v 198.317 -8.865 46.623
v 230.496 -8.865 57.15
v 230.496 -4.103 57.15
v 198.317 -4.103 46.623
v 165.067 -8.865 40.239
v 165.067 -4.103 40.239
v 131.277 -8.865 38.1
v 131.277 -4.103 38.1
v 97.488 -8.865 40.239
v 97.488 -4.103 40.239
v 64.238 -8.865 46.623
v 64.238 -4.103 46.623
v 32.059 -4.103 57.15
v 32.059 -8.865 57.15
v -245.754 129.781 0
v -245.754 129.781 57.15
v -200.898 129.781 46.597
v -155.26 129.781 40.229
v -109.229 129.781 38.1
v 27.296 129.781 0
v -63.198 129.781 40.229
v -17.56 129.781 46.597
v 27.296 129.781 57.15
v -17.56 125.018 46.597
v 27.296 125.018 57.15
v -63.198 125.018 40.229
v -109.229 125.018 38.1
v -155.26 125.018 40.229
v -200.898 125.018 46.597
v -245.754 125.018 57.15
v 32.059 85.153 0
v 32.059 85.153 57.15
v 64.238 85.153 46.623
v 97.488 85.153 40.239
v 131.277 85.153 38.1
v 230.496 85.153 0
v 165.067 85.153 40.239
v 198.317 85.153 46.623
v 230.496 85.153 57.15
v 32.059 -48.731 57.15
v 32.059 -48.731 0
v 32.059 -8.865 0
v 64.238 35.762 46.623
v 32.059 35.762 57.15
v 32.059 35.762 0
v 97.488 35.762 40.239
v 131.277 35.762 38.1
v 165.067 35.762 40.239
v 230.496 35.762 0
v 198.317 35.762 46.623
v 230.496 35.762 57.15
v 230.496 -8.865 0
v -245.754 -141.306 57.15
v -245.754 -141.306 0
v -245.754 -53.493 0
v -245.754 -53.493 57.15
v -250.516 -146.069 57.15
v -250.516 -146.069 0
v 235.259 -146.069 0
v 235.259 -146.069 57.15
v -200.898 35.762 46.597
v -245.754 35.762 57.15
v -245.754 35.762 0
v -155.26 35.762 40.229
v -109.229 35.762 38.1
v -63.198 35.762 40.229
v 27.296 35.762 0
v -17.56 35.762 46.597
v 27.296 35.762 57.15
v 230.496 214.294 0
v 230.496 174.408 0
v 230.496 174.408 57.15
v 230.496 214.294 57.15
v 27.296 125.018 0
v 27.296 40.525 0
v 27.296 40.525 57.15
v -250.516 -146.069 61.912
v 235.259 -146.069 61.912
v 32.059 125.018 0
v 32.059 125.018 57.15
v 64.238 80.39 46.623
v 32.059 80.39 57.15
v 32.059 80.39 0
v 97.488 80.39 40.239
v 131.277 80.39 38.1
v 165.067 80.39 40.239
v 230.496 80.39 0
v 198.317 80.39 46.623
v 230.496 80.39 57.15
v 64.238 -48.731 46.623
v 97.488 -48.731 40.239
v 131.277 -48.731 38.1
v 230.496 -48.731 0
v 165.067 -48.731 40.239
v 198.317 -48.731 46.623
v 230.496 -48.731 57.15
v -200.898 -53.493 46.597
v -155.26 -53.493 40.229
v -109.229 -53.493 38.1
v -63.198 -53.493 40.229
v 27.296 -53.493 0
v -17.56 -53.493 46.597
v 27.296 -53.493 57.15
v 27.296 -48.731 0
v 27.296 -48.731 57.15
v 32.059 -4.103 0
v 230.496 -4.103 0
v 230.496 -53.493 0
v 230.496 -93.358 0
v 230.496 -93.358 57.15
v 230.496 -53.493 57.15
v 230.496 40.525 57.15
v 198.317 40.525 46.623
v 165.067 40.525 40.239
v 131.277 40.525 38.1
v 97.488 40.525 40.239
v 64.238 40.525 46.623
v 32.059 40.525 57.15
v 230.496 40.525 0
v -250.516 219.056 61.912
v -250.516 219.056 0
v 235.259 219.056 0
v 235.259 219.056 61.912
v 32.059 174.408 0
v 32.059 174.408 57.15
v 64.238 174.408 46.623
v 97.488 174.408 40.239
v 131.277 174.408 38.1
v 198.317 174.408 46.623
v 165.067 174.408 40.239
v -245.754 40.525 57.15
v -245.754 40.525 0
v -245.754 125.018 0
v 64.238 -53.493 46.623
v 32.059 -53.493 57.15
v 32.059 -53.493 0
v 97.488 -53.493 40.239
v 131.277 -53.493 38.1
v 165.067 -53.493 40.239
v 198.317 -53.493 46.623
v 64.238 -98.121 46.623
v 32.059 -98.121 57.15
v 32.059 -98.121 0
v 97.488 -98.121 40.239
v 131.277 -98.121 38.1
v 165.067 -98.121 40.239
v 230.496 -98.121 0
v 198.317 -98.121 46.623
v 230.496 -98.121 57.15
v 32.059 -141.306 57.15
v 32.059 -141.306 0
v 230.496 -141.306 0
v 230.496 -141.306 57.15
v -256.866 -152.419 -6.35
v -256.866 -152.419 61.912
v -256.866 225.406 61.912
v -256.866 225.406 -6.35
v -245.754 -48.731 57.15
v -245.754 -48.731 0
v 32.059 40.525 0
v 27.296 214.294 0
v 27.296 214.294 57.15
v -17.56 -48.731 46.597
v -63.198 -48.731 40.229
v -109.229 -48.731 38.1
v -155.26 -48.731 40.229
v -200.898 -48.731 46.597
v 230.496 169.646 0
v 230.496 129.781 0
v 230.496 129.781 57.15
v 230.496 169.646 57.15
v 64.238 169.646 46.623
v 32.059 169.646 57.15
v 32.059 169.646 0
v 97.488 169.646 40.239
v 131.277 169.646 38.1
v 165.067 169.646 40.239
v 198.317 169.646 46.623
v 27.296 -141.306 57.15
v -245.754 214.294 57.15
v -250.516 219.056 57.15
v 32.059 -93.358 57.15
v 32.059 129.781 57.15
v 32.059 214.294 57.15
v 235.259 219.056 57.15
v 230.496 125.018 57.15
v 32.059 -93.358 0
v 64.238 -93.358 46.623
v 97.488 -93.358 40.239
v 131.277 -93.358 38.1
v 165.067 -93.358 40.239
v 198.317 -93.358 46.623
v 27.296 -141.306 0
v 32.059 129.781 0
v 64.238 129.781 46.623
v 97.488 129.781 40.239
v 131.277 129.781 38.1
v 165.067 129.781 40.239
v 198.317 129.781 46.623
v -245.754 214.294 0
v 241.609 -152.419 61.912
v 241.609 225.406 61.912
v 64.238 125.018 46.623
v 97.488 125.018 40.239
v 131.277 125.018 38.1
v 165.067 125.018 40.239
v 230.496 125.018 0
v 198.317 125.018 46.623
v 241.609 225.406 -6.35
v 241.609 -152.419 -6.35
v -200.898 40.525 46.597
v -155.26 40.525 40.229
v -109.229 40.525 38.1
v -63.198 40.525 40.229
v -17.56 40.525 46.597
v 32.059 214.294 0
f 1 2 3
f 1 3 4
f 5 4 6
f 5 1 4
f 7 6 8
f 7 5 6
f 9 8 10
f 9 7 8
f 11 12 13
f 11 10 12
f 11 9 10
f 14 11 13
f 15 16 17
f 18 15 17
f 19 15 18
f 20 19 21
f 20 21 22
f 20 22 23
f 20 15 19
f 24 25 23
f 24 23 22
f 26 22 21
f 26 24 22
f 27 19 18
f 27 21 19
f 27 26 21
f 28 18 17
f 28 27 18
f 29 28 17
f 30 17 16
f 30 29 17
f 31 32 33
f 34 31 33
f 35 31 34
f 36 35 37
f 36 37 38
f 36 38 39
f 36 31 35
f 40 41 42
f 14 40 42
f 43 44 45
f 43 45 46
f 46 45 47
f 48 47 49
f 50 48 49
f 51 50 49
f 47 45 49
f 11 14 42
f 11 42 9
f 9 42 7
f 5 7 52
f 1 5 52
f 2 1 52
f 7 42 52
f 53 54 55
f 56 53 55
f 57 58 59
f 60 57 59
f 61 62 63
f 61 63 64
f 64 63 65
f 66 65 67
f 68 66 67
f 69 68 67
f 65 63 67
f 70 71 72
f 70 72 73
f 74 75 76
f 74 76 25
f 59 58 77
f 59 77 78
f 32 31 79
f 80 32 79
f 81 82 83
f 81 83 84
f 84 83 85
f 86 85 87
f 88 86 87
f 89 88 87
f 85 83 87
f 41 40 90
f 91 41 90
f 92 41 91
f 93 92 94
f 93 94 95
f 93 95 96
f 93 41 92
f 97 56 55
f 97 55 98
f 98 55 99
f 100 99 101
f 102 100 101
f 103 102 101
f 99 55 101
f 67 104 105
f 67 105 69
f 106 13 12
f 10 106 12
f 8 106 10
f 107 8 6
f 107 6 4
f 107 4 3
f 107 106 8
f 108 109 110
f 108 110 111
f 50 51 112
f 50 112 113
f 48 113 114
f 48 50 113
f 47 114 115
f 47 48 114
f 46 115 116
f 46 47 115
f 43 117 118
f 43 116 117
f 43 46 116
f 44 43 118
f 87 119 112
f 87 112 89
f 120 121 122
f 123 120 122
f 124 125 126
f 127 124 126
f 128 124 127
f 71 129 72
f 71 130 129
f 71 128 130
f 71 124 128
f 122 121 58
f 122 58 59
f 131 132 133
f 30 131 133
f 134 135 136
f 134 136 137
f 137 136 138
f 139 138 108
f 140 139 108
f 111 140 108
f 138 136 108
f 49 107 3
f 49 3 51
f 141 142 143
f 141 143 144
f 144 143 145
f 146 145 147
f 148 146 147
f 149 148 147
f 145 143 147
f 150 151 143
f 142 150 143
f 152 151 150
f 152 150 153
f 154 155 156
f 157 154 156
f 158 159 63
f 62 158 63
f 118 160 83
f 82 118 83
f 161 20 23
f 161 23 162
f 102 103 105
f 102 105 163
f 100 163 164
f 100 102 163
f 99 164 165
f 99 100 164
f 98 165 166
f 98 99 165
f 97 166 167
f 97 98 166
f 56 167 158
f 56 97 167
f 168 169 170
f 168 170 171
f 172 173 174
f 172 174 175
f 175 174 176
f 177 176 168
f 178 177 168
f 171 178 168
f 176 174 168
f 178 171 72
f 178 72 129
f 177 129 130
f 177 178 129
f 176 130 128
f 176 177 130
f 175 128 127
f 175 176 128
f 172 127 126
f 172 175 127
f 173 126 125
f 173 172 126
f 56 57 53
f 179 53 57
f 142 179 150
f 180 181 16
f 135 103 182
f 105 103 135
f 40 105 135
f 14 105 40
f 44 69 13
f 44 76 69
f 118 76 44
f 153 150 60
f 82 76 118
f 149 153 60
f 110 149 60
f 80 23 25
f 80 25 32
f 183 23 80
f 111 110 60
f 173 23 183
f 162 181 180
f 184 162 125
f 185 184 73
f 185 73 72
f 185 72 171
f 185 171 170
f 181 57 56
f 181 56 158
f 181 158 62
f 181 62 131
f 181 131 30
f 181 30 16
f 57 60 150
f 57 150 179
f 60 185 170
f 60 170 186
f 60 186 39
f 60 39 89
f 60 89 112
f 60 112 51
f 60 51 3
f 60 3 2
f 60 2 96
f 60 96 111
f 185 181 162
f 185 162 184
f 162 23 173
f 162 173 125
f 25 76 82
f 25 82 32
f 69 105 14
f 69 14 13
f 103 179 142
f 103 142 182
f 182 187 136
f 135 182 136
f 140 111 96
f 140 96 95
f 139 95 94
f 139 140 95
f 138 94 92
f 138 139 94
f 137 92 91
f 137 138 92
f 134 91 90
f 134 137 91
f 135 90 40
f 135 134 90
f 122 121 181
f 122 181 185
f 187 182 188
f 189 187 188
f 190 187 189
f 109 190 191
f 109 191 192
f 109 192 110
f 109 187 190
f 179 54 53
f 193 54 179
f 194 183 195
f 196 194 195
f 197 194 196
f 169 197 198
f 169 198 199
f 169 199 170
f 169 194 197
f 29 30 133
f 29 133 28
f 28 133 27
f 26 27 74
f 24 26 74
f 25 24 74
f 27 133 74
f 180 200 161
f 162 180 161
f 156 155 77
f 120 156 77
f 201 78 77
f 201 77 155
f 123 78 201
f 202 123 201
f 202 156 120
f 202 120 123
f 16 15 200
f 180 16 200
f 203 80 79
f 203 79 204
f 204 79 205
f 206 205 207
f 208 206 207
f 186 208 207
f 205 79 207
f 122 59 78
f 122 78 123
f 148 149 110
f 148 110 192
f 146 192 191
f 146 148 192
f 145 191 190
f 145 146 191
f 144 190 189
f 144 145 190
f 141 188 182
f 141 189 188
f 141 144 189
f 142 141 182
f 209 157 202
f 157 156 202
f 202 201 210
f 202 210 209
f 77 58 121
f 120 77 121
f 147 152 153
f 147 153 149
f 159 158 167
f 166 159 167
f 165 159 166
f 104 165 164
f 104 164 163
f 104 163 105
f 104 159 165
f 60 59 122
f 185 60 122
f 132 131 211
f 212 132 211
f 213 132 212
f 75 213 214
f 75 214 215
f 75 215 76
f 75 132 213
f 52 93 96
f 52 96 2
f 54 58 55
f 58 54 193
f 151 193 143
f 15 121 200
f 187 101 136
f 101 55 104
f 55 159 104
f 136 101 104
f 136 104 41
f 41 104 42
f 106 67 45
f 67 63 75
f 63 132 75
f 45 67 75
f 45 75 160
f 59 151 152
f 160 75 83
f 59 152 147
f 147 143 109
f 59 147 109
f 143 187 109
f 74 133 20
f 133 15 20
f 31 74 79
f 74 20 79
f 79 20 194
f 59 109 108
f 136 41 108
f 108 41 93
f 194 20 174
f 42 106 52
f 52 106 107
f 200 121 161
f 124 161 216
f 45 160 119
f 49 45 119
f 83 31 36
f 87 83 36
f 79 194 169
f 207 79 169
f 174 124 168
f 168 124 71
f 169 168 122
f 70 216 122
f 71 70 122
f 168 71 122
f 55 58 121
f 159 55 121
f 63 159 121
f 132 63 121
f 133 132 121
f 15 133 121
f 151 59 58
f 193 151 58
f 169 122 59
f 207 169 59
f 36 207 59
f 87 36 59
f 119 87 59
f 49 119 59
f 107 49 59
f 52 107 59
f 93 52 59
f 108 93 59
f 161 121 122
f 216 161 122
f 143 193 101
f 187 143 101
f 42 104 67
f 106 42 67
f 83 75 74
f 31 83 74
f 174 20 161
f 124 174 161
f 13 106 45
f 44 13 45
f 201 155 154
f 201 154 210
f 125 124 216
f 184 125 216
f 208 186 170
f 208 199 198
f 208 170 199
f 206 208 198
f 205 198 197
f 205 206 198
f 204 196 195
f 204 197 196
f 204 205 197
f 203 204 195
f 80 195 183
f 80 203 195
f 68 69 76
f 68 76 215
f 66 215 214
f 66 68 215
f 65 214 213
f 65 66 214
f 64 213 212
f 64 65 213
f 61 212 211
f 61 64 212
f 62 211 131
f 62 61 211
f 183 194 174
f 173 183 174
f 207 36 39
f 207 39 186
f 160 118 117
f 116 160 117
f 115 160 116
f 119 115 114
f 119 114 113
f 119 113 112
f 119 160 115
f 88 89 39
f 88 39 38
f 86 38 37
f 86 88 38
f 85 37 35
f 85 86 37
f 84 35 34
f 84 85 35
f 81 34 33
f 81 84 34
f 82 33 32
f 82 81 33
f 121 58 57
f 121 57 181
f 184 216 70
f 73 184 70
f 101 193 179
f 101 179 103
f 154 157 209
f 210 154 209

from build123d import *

# Parameters (mm, degrees)
F0_W     = 485.775
F0_H     = 365.125
F0_W_2   = 273.05
F0_H_2   = 87.8133544401
F0_H_3   = 84.4931
F0_W_3   = 198.4375
F0_H_4   = 43.1855544401
F0_H_5   = 39.8653
F0_H_6   = 84.5129455599
F0_H_7   = 39.8851455599
F1_DEPTH = 57.15
F0_W_4   = 498.475
F0_H_8   = 377.825
F2_DEPTH = 61.9125
F5_DEPTH = 315.7148544401
F3_W     = 498.475
F3_H     = 377.825
F6_DEPTH = 6.35


with BuildPart() as f1:
    # F0 (on Top) → F1 (new body)
    with BuildSketch(Plane.XY):
        with Locations((-7.6289700516, 36.4935102986)):
            Rectangle(F0_W, F0_H)
        with Locations((-109.2289700516, -97.3998124813)):
            Rectangle(F0_W_2, F0_H_2, mode=Mode.SUBTRACT)
        with Locations((-109.2289700516, -6.4840852612)):
            Rectangle(F0_W_2, F0_H_3, mode=Mode.SUBTRACT)
        with Locations((131.2772799484, -119.7137124813)):
            Rectangle(F0_W_3, F0_H_4, mode=Mode.SUBTRACT)
        with Locations((131.2772799484, -73.4257852612)):
            Rectangle(F0_W_3, F0_H_5, mode=Mode.SUBTRACT)
        with Locations((131.2772799484, -28.7979852612)):
            Rectangle(F0_W_3, F0_H_5, mode=Mode.SUBTRACT)
        with Locations((131.2772799484, 15.8298147388)):
            Rectangle(F0_W_3, F0_H_5, mode=Mode.SUBTRACT)
        with Locations((-109.2289700516, 82.7715147388)):
            Rectangle(F0_W_2, F0_H_3, mode=Mode.SUBTRACT)
        with Locations((-109.2289700516, 172.0370375187)):
            Rectangle(F0_W_2, F0_H_6, mode=Mode.SUBTRACT)
        with Locations((131.2772799484, 60.4576147388)):
            Rectangle(F0_W_3, F0_H_5, mode=Mode.SUBTRACT)
        with Locations((131.2772799484, 105.0854147388)):
            Rectangle(F0_W_3, F0_H_5, mode=Mode.SUBTRACT)
        with Locations((131.2772799484, 149.7132147388)):
            Rectangle(F0_W_3, F0_H_5, mode=Mode.SUBTRACT)
        with Locations((131.2772799484, 194.3509375187)):
            Rectangle(F0_W_3, F0_H_7, mode=Mode.SUBTRACT)
    extrude(amount=F1_DEPTH)

    # F4 (on face) → F5 (cut, through all)
    with BuildSketch(Plane(origin=(0, -141.3064897014, 0), x_dir=(-1, 0, 0), z_dir=(0, 1, 0))):
        with BuildLine():
            Line((-32.0585299484, 57.15), (-230.4960299484, 57.15))
            ThreePointArc((-230.4960299484, 57.15), (-131.2772799484, 38.1), (-32.0585299484, 57.15))
        make_face()
        with BuildLine():
            ThreePointArc((-27.2960299484, 57.15), (109.2289700516, 38.1), (245.7539700516, 57.15))
            Line((245.7539700516, 57.15), (-27.2960299484, 57.15))
        make_face()
    extrude(amount=F5_DEPTH, mode=Mode.SUBTRACT)


with BuildPart() as f2:
    # F0 (on Top) → F2 (new body)
    with BuildSketch(Plane.XY):
        with Locations((-7.6289700516, 36.4935102986)):
            Rectangle(F0_W_4, F0_H_8)
        with Locations((-7.6289700516, 36.4935102986)):
            Rectangle(F0_W, F0_H, mode=Mode.SUBTRACT)
    extrude(amount=F2_DEPTH)

    # F3 (on face) → F6 (join)
    with BuildSketch(Plane.XY):
        with Locations((-7.6289700516, 36.4935102986)):
            Rectangle(F3_W, F3_H)
    extrude(amount=-F6_DEPTH)


solid = Compound([f1.part, f2.part])
